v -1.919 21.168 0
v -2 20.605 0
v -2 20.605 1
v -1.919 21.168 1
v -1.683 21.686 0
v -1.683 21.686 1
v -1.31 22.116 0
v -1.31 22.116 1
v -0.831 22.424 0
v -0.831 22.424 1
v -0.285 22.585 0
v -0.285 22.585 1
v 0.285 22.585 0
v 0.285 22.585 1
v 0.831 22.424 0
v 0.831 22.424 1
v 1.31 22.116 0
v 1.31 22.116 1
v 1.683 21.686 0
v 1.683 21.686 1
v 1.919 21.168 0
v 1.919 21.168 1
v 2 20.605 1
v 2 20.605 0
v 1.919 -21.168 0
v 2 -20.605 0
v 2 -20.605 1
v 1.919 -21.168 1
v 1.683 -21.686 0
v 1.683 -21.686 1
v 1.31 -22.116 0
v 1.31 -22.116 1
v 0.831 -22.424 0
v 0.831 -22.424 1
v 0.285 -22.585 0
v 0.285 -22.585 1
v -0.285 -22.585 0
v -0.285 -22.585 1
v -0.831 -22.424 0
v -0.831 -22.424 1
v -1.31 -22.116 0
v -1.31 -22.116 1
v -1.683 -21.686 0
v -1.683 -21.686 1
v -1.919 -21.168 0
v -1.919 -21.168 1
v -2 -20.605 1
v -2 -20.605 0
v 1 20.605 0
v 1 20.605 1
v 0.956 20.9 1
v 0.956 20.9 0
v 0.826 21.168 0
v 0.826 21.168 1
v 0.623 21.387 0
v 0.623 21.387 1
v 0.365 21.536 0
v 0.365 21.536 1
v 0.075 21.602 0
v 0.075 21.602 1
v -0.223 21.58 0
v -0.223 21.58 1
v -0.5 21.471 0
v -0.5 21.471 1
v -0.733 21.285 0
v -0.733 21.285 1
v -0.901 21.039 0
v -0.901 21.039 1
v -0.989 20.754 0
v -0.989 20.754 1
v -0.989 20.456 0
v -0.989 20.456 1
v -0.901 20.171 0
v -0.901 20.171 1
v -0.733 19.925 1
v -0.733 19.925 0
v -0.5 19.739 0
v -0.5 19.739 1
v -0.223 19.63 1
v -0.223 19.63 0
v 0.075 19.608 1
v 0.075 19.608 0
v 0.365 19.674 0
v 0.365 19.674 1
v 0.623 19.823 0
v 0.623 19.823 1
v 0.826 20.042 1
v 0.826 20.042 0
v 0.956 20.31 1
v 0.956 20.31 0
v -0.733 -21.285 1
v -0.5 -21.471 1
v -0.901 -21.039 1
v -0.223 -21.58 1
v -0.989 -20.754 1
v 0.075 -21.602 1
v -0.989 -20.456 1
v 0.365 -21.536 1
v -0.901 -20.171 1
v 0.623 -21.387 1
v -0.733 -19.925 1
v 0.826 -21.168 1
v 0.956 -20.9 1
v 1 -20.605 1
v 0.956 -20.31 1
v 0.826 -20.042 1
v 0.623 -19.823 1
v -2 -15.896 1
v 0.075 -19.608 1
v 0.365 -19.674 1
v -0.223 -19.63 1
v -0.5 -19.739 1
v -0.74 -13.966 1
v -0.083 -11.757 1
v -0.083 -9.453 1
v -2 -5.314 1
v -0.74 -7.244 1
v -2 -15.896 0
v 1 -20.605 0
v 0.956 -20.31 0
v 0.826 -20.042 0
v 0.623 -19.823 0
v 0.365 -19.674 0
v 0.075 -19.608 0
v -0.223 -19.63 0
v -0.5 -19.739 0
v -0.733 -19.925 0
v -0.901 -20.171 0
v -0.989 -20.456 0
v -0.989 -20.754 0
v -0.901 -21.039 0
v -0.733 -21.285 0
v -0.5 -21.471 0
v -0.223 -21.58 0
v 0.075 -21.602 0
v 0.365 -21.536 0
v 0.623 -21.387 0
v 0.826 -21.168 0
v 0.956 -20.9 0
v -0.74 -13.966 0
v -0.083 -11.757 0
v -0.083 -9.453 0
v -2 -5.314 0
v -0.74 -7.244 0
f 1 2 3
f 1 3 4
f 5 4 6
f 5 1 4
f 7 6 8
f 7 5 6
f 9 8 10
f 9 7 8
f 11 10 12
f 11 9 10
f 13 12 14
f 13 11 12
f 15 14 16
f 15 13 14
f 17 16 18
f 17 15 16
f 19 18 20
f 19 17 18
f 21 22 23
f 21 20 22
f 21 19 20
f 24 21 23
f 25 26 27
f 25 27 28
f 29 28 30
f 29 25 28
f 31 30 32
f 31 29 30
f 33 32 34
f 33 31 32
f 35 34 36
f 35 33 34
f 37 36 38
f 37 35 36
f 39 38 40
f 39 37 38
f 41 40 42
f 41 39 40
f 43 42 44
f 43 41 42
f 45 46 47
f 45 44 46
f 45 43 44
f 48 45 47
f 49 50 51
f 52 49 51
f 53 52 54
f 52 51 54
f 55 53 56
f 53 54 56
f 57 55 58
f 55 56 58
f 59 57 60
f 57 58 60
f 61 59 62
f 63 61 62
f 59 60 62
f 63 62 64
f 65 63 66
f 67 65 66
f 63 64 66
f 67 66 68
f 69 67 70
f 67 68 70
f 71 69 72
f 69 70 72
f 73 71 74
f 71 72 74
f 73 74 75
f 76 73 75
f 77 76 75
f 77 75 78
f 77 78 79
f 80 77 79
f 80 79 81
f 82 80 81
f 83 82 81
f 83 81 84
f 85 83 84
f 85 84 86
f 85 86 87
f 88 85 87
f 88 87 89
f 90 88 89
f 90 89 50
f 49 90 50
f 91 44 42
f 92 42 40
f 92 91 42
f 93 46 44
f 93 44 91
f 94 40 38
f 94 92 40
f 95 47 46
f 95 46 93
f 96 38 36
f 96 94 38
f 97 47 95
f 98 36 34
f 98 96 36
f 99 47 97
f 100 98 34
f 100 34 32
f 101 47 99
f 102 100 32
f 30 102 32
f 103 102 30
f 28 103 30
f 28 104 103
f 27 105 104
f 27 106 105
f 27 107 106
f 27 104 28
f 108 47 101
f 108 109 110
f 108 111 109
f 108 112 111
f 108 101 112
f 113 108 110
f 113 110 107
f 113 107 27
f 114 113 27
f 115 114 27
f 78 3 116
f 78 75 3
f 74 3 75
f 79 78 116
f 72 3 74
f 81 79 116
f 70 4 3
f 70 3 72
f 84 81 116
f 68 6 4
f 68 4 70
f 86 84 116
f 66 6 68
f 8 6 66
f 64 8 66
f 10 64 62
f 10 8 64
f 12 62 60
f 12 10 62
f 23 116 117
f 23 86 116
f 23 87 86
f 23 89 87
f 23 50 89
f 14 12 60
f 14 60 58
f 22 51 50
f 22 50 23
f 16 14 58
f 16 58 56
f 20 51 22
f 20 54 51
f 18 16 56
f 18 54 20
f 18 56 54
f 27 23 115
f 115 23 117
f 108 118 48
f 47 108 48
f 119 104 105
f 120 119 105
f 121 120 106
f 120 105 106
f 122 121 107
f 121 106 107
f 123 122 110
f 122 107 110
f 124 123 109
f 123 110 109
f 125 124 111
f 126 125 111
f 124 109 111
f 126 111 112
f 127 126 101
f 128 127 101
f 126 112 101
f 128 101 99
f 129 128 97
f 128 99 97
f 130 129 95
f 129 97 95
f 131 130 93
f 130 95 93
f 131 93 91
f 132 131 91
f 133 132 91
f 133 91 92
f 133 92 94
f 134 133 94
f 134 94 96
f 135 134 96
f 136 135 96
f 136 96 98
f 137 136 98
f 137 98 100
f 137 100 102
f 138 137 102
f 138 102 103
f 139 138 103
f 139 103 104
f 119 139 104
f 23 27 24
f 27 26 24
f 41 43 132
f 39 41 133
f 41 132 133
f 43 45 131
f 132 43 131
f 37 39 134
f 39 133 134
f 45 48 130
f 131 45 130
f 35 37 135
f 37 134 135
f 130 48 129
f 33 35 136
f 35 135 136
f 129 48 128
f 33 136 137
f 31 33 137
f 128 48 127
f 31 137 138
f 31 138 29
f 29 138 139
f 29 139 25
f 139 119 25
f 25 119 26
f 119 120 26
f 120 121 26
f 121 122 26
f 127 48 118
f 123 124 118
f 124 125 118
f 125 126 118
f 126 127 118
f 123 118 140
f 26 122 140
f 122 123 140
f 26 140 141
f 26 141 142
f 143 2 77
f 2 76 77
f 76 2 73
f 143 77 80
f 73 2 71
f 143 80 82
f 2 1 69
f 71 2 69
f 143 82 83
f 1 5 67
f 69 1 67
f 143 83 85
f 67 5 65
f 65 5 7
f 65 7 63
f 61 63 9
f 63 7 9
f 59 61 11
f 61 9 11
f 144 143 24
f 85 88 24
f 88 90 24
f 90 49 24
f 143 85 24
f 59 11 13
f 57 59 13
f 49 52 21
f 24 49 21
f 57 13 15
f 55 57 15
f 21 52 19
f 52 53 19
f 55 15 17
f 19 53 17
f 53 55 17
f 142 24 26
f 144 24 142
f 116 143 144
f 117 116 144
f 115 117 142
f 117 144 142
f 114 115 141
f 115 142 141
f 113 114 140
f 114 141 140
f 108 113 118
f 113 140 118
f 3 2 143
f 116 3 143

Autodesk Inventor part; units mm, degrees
ref_plane "YZ Plane" through (0, 0, 0) normal (1, 0, 0) x (0, 1, 0)
ref_plane "XZ Plane" through (0, 0, 0) normal (0, 1, 0) x (-1, 0, 0)
ref_plane "XY Plane" through (0, 0, 0) normal (0, 0, 1) x (1, 0, 0)
sketch "草圖1" plane through (0, 0, 0) normal (0, 0, 1) x (1, 0, 0)
  line L0 (0, -20.605) -> (0, 20.605) construction
  line L1 (2, -20.605) -> (2, 20.605)
  line L2 (-2, 20.605) -> (-2, -20.605)
  arc A0 (-2, -20.605) -> (2, -20.605) centre (0, -20.605) ccw
  arc A1 (2, 20.605) -> (-2, 20.605) centre (0, 20.605) ccw
  point P0 (0, 0)
  dimension "d0" = 41.21
  dimension "d1" = 4
extrude "擠出1" add sketch "草圖1" along normal blind 1
sketch "草圖2" plane through (0, 0, 1) normal (0, 0, 1) x (1, 0, 0)
  arc A0 (-2, -20.605) -> (2, -20.605) centre (0, -20.605) ccw projected
  circle A1 centre (0, -20.605) radius 0.75
  arc A2 (2, 20.605) -> (-2, 20.605) centre (0, 20.605) ccw projected
  circle A3 centre (0, 20.605) radius 0.75
  point P0 (0, 0)
  dimension "d4" = 1.5
  dimension "d5" = 1.5
extrude "擠出2" add sketch "草圖2" along normal blind 1
sketch "草圖3" plane through (0, 0, 1) normal (0, 0, 1) x (1, 0, 0)
  circle A0 centre (0, 20.605) radius 0.75 projected
  circle A1 centre (0, -20.605) radius 0.75 projected
  circle A2 centre (0, 20.605) radius 1
  circle A3 centre (0, -20.605) radius 0.75 projected
  circle A4 centre (0, -20.605) radius 1
  point P0 (0, 0)
  dimension "d8" = 2
  dimension "d9" = 2
extrude "擠出3" cut sketch "草圖3" along normal mid plane 10 contours A0 | A1 | A2 | A4
sketch "草圖4" plane through (0, 0, 1) normal (0, 0, 1) x (1, 0, 0)
  line L0 (-2, 20.605) -> (-2, -20.605) projected
  arc A0 (-2, -15.8965) -> (-2, -5.3135) centre (-8, -10.605) ccw
  circle A1 centre (0, -20.605) radius 1 projected
  point P0 (0, 0)
  dimension "d12" = 8
  dimension "d13" = 6
  dimension "d14" = 10
extrude "擠出4" cut sketch "草圖4" along normal mid plane 10 contours A0 L0
properties part number "連桿3"
